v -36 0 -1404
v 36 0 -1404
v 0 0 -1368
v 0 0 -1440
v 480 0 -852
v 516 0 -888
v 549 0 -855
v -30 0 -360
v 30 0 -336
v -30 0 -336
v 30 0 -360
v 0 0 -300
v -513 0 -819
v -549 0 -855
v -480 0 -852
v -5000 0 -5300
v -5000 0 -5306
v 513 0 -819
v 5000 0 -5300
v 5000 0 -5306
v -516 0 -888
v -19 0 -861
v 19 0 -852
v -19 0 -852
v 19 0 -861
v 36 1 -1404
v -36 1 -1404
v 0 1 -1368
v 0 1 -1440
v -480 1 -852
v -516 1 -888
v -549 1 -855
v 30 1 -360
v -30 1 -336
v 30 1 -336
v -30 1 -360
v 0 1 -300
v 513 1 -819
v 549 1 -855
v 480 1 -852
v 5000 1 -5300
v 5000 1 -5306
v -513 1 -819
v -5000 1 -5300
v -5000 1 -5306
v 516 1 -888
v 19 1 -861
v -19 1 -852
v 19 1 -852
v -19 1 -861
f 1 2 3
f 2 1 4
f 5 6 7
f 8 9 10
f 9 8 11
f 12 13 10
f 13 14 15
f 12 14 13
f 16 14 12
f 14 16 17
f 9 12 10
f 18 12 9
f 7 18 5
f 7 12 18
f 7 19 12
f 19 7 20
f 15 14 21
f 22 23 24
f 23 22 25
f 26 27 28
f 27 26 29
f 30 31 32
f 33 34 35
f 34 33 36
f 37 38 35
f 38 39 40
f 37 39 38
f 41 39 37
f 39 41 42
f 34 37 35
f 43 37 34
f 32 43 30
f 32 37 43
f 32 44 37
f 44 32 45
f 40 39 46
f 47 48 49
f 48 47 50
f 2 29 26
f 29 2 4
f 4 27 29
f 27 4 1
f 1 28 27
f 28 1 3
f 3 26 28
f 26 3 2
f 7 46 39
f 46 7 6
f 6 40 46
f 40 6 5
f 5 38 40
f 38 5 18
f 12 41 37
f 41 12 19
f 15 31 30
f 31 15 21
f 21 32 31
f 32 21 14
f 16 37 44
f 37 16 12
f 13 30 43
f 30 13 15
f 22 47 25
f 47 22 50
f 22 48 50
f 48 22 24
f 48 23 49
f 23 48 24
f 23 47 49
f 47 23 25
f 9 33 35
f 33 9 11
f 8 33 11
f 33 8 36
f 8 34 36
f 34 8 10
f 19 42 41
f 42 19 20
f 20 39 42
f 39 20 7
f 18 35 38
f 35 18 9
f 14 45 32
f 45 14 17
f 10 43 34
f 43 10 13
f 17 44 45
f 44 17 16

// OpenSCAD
$fs = 120;

$vpt = [0,1080,480];
$vpr = [-34,0,0];
$vpf = 45;

foul_line = 6;
plain_color = [1,1,1,0.8];
out_color = [1,0.75,0.75,0.8];
eat_color = [0.5,0.75,1,0.8];

// home, first, second, third, rubber
color([1,1,1]) scale([1,-1,-1]) rotate([90,0,0]) linear_extrude(1) {
    polygon([[-30,30*2+300],[30,30*2+300],[30,30+300],[0,300],[-30,30+300]]);
    polygon([[552-36*2,852],[552-36,852+36],[552,852],[552-36,852-36]]);
    polygon([[0,1404+36],[36,1404],[0,1404-36],[-36,1404]]);
    polygon([[-552+36*2,852],[-552+36,852+36],[-552,852],[-552+36,852-36]]);
    polygon([[-19,852],[19,852],[19,9+852],[-19,9+852]]);
}

// foul lines
color([1,1,1,0.5]) scale([1,-1,-1]) rotate([90,0,0]) linear_extrude(1) {
    polygon([[0,300],[-5000,300+5000],[-5000,300+5000+foul_line],[0,300+foul_line]]);
    polygon([[0,300],[5000,300+5000],[5000,300+5000+foul_line],[0,300+foul_line]]);
}

scale([0.1,0.1,-0.1]) translate([-23200,0,0]) {
    color(out_color) polyhedron([[9830,0,15820],[13170,0,23860],[9830,1150,15820],[13170,1150,23860]], [[0,1,3,2]]);
    color(out_color) polyhedron([[9830,0,15820],[9830,0,15920],[9830,1150,15820],[9830,1150,15920]], [[0,1,3,2]]);
    color(out_color) polyhedron([[13170,0,23860],[13170,0,23960],[13170,1150,23860],[13170,1150,23960]], [[0,1,3,2]]);
    color(out_color) polyhedron([[9830,0,15920],[13170,0,23960],[9830,1150,15920],[13170,1150,23960]], [[0,1,3,2]]);
    color(out_color) polyhedron([[9830,1150,15820],[9830,1150,15920],[13170,1150,23860],[13170,1150,23960]], [[0,1,3,2]]);
    color(out_color) polyhedron([[13170,0,23860],[19620,0,28270],[13170,1150,23860],[19620,1150,28270]], [[0,1,3,2]]);
    color(out_color) polyhedron([[13170,0,23860],[13170,0,23960],[13170,1150,23860],[13170,1150,23960]], [[0,1,3,2]]);
    color(out_color) polyhedron([[19620,0,28270],[19620,0,28370],[19620,1150,28270],[19620,1150,28370]], [[0,1,3,2]]);
    color(out_color) polyhedron([[13170,0,23960],[19620,0,28370],[13170,1150,23960],[19620,1150,28370]], [[0,1,3,2]]);
    color(out_color) polyhedron([[13170,1150,23860],[13170,1150,23960],[19620,1150,28270],[19620,1150,28370]], [[0,1,3,2]]);
    color(out_color) polyhedron([[19620,0,28270],[20680,0,28270],[19620,1150,28270],[20680,1150,28270]], [[0,1,3,2]]);
    color(out_color) polyhedron([[19620,0,28270],[19620,0,28370],[19620,1150,28270],[19620,1150,28370]], [[0,1,3,2]]);
    color(out_color) polyhedron([[20680,0,28270],[20680,0,28370],[20680,1150,28270],[20680,1150,28370]], [[0,1,3,2]]);
    color(out_color) polyhedron([[19620,0,28370],[20680,0,28370],[19620,1150,28370],[20680,1150,28370]], [[0,1,3,2]]);
    color(out_color) polyhedron([[19620,1150,28270],[19620,1150,28370],[20680,1150,28270],[20680,1150,28370]], [[0,1,3,2]]);
    color(plain_color) polyhedron([[20680,0,28270],[25520,0,28270],[20680,1150,28270],[25520,1150,28270]], [[0,1,3,2]]);
    color(plain_color) polyhedron([[20680,0,28270],[20680,0,28370],[20680,1150,28270],[20680,1150,28370]], [[0,1,3,2]]);
    color(plain_color) polyhedron([[25520,0,28270],[25520,0,28370],[25520,1150,28270],[25520,1150,28370]], [[0,1,3,2]]);
    color(plain_color) polyhedron([[20680,0,28370],[25520,0,28370],[20680,1150,28370],[25520,1150,28370]], [[0,1,3,2]]);
    color(plain_color) polyhedron([[20680,1150,28270],[20680,1150,28370],[25520,1150,28270],[25520,1150,28370]], [[0,1,3,2]]);
    color(out_color) polyhedron([[25520,0,28270],[26780,0,28270],[25520,1150,28270],[26780,1150,28270]], [[0,1,3,2]]);
    color(out_color) polyhedron([[25520,0,28270],[25520,0,28370],[25520,1150,28270],[25520,1200,28370]], [[0,1,3,2]]);
    color(out_color) polyhedron([[26780,0,28270],[26790,0,28370],[26780,1150,28270],[26790,1200,28370]], [[0,1,3,2]]);
    color(out_color) polyhedron([[25520,0,28370],[26790,0,28370],[25520,1200,28370],[26790,1200,28370]], [[0,1,3,2]]);
    color(out_color) polyhedron([[25520,1150,28270],[25520,1200,28370],[26780,1150,28270],[26790,1200,28370]], [[0,1,3,2]]);
    color(out_color) polyhedron([[26780,0,28270],[33230,0,23860],[26780,1150,28270],[33230,1150,23860]], [[0,1,3,2]]);
    color(out_color) polyhedron([[26780,0,28270],[26780,0,28370],[26780,1150,28270],[26780,1150,28370]], [[0,1,3,2]]);
    color(out_color) polyhedron([[33230,0,23860],[33230,0,23960],[33230,1150,23860],[33230,1150,23960]], [[0,1,3,2]]);
    color(out_color) polyhedron([[26780,0,28370],[33230,0,23960],[26780,1150,28370],[33230,1150,23960]], [[0,1,3,2]]);
    color(out_color) polyhedron([[26780,1150,28270],[26780,1150,28370],[33230,1150,23860],[33230,1150,23960]], [[0,1,3,2]]);
    color(out_color) polyhedron([[33230,0,23860],[36570,0,15820],[33230,1150,23860],[36570,1150,15820]], [[0,1,3,2]]);
    color(out_color) polyhedron([[33230,0,23860],[33230,0,23960],[33230,1150,23860],[33230,1150,23960]], [[0,1,3,2]]);
    color(out_color) polyhedron([[36570,0,15820],[36570,0,15920],[36570,1150,15820],[36570,1150,15920]], [[0,1,3,2]]);
    color(out_color) polyhedron([[33230,0,23960],[36570,0,15920],[33230,1150,23960],[36570,1150,15920]], [[0,1,3,2]]);
    color(out_color) polyhedron([[33230,1150,23860],[33230,1150,23960],[36570,1150,15820],[36570,1150,15920]], [[0,1,3,2]]);
    color(out_color) polyhedron([[16130,0,5030],[18700,0,2560],[16130,1100,5030],[18700,1100,2560]], [[0,1,3,2]]);
    color(out_color) polyhedron([[16130,0,5030],[16970,0,6570],[16130,1100,5030],[16970,1500,6570]], [[0,1,3,2]]);
    color(out_color) polyhedron([[18700,0,2560],[19850,0,3680],[18700,1100,2560],[19850,1500,3680]], [[0,1,3,2]]);
    color(out_color) polyhedron([[16970,0,6570],[19850,0,3680],[16970,1500,6570],[19850,1500,3680]], [[0,1,3,2]]);
    color(out_color) polyhedron([[16130,1100,5030],[16970,1500,6570],[18700,1100,2560],[19850,1500,3680]], [[0,1,3,2]]);
    color(out_color) polyhedron([[27700,0,2560],[30270,0,5030],[27700,1100,2560],[30270,1100,5030]], [[0,1,3,2]]);
    color(out_color) polyhedron([[27700,0,2560],[26550,0,3680],[27700,1100,2560],[26550,1500,3680]], [[0,1,3,2]]);
    color(out_color) polyhedron([[30270,0,5030],[29440,0,6570],[30270,1100,5030],[29440,1500,6570]], [[0,1,3,2]]);
    color(out_color) polyhedron([[26550,0,3680],[29440,0,6570],[26550,1500,3680],[29440,1500,6570]], [[0,1,3,2]]);
    color(out_color) polyhedron([[27700,1100,2560],[26550,1500,3680],[30270,1100,5030],[29440,1500,6570]], [[0,1,3,2]]);
    color(out_color) polyhedron([[20680,0,28370],[25520,0,28370],[20680,3500,28370],[25520,3500,28370]], [[0,1,3,2]]);
    color(out_color) polyhedron([[20680,0,28370],[20680,0,28470],[20680,3500,28370],[20680,3500,28470]], [[0,1,3,2]]);
    color(out_color) polyhedron([[25520,0,28370],[25520,0,28480],[25520,3500,28370],[25520,3500,28480]], [[0,1,3,2]]);
    color(out_color) polyhedron([[20680,0,28470],[25520,0,28480],[20680,3500,28470],[25520,3500,28480]], [[0,1,3,2]]);
    color(out_color) polyhedron([[20680,3500,28370],[20680,3500,28470],[25520,3500,28370],[25520,3500,28480]], [[0,1,3,2]]);
    color(out_color) polyhedron([[2900,0,17745],[19700,0,1598],[2900,5,17745],[19700,5,1598]], [[0,1,3,2]]);
    color(out_color) polyhedron([[2900,0,17745],[2900,0,17755],[2900,5,17745],[2900,5,17755]], [[0,1,3,2]]);
    color(out_color) polyhedron([[19700,0,1598],[19700,0,1608],[19700,5,1598],[19700,5,1608]], [[0,1,3,2]]);
    color(out_color) polyhedron([[2900,0,17755],[19700,0,1608],[2900,5,17755],[19700,5,1608]], [[0,1,3,2]]);
    color(out_color) polyhedron([[2900,5,17745],[2900,5,17755],[19700,5,1598],[19700,5,1608]], [[0,1,3,2]]);
    color(out_color) polyhedron([[26000,0,925],[40000,0,14381],[26000,5,925],[40000,5,14381]], [[0,1,3,2]]);
    color(out_color) polyhedron([[26000,0,925],[26000,0,935],[26000,5,925],[26000,5,935]], [[0,1,3,2]]);
    color(out_color) polyhedron([[40000,0,14381],[40000,0,14391],[40000,5,14381],[40000,5,14391]], [[0,1,3,2]]);
    color(out_color) polyhedron([[26000,0,935],[40000,0,14391],[26000,5,935],[40000,5,14391]], [[0,1,3,2]]);
    color(out_color) polyhedron([[26000,5,925],[26000,5,935],[40000,5,14381],[40000,5,14391]], [[0,1,3,2]]);
    color(plain_color) polyhedron([[0,0,0],[0,0,0],[0,0,0],[0,0,0]], [[0,1,3,2]]);
    color(plain_color) polyhedron([[0,0,0],[0,0,0],[0,0,0],[0,0,0]], [[0,1,3,2]]);
    color(plain_color) polyhedron([[0,0,0],[0,0,0],[0,0,0],[0,0,0]], [[0,1,3,2]]);
    color(plain_color) polyhedron([[0,0,0],[0,0,0],[0,0,0],[0,0,0]], [[0,1,3,2]]);
    color(plain_color) polyhedron([[0,0,0],[0,0,0],[0,0,0],[0,0,0]], [[0,1,3,2]]);
    color(plain_color) polyhedron([[0,0,0],[0,0,0],[0,0,0],[0,0,0]], [[0,1,3,2]]);
    color(plain_color) polyhedron([[0,0,0],[0,0,0],[0,0,0],[0,0,0]], [[0,1,3,2]]);
    color(plain_color) polyhedron([[0,0,0],[0,0,0],[0,0,0],[0,0,0]], [[0,1,3,2]]);
    color(plain_color) polyhedron([[0,0,0],[0,0,0],[0,0,0],[0,0,0]], [[0,1,3,2]]);
    color(plain_color) polyhedron([[0,0,0],[0,0,0],[0,0,0],[0,0,0]], [[0,1,3,2]]);
    color(plain_color) polyhedron([[0,0,0],[0,0,0],[0,0,0],[0,0,0]], [[0,1,3,2]]);
    color(plain_color) polyhedron([[0,0,0],[0,0,0],[0,0,0],[0,0,0]], [[0,1,3,2]]);
    color(plain_color) polyhedron([[0,0,0],[0,0,0],[0,0,0],[0,0,0]], [[0,1,3,2]]);
    color(plain_color) polyhedron([[0,0,0],[0,0,0],[0,0,0],[0,0,0]], [[0,1,3,2]]);
    color(plain_color) polyhedron([[0,0,0],[0,0,0],[0,0,0],[0,0,0]], [[0,1,3,2]]);
    color(plain_color) polyhedron([[0,0,0],[0,0,0],[0,0,0],[0,0,0]], [[0,1,3,2]]);
    color(plain_color) polyhedron([[0,0,0],[0,0,0],[0,0,0],[0,0,0]], [[0,1,3,2]]);
    color(plain_color) polyhedron([[0,0,0],[0,0,0],[0,0,0],[0,0,0]], [[0,1,3,2]]);
    color(plain_color) polyhedron([[0,0,0],[0,0,0],[0,0,0],[0,0,0]], [[0,1,3,2]]);
    color(plain_color) polyhedron([[0,0,0],[0,0,0],[0,0,0],[0,0,0]], [[0,1,3,2]]);
    color(plain_color) polyhedron([[0,0,0],[0,0,0],[0,0,0],[0,0,0]], [[0,1,3,2]]);
    color(plain_color) polyhedron([[0,0,0],[0,0,0],[0,0,0],[0,0,0]], [[0,1,3,2]]);
    color(plain_color) polyhedron([[0,0,0],[0,0,0],[0,0,0],[0,0,0]], [[0,1,3,2]]);
    color(plain_color) polyhedron([[0,0,0],[0,0,0],[0,0,0],[0,0,0]], [[0,1,3,2]]);
    color(plain_color) polyhedron([[0,0,0],[0,0,0],[0,0,0],[0,0,0]], [[0,1,3,2]]);
    color(plain_color) polyhedron([[0,0,0],[0,0,0],[0,0,0],[0,0,0]], [[0,1,3,2]]);
    color(plain_color) polyhedron([[0,0,0],[0,0,0],[0,0,0],[0,0,0]], [[0,1,3,2]]);
    color(plain_color) polyhedron([[0,0,0],[0,0,0],[0,0,0],[0,0,0]], [[0,1,3,2]]);
    color(plain_color) polyhedron([[0,0,0],[0,0,0],[0,0,0],[0,0,0]], [[0,1,3,2]]);
    color(plain_color) polyhedron([[0,0,0],[0,0,0],[0,0,0],[0,0,0]], [[0,1,3,2]]);
    color(plain_color) polyhedron([[0,0,0],[0,0,0],[0,0,0],[0,0,0]], [[0,1,3,2]]);
    color(plain_color) polyhedron([[0,0,0],[0,0,0],[0,0,0],[0,0,0]], [[0,1,3,2]]);
    color(plain_color) polyhedron([[0,0,0],[0,0,0],[0,0,0],[0,0,0]], [[0,1,3,2]]);
    color(plain_color) polyhedron([[0,0,0],[0,0,0],[0,0,0],[0,0,0]], [[0,1,3,2]]);
    color(plain_color) polyhedron([[0,0,0],[0,0,0],[0,0,0],[0,0,0]], [[0,1,3,2]]);
    color(plain_color) polyhedron([[0,0,0],[0,0,0],[0,0,0],[0,0,0]], [[0,1,3,2]]);
    color(plain_color) polyhedron([[0,0,0],[0,0,0],[0,0,0],[0,0,0]], [[0,1,3,2]]);
    color(plain_color) polyhedron([[0,0,0],[0,0,0],[0,0,0],[0,0,0]], [[0,1,3,2]]);
    color(plain_color) polyhedron([[0,0,0],[0,0,0],[0,0,0],[0,0,0]], [[0,1,3,2]]);
    color(plain_color) polyhedron([[0,0,0],[0,0,0],[0,0,0],[0,0,0]], [[0,1,3,2]]);
    color(plain_color) polyhedron([[0,0,0],[0,0,0],[0,0,0],[0,0,0]], [[0,1,3,2]]);
    color(plain_color) polyhedron([[0,0,0],[0,0,0],[0,0,0],[0,0,0]], [[0,1,3,2]]);
    color(plain_color) polyhedron([[0,0,0],[0,0,0],[0,0,0],[0,0,0]], [[0,1,3,2]]);
    color(plain_color) polyhedron([[0,0,0],[0,0,0],[0,0,0],[0,0,0]], [[0,1,3,2]]);
    color(plain_color) polyhedron([[0,0,0],[0,0,0],[0,0,0],[0,0,0]], [[0,1,3,2]]);
    color(plain_color) polyhedron([[0,0,0],[0,0,0],[0,0,0],[0,0,0]], [[0,1,3,2]]);
    color(plain_color) polyhedron([[0,0,0],[0,0,0],[0,0,0],[0,0,0]], [[0,1,3,2]]);
    color(plain_color) polyhedron([[0,0,0],[0,0,0],[0,0,0],[0,0,0]], [[0,1,3,2]]);
    color(plain_color) polyhedron([[0,0,0],[0,0,0],[0,0,0],[0,0,0]], [[0,1,3,2]]);
    color(plain_color) polyhedron([[0,0,0],[0,0,0],[0,0,0],[0,0,0]], [[0,1,3,2]]);
    color(plain_color) polyhedron([[0,0,0],[0,0,0],[0,0,0],[0,0,0]], [[0,1,3,2]]);
    color(plain_color) polyhedron([[0,0,0],[0,0,0],[0,0,0],[0,0,0]], [[0,1,3,2]]);
    color(plain_color) polyhedron([[0,0,0],[0,0,0],[0,0,0],[0,0,0]], [[0,1,3,2]]);
    color(plain_color) polyhedron([[0,0,0],[0,0,0],[0,0,0],[0,0,0]], [[0,1,3,2]]);
    color(plain_color) polyhedron([[0,0,0],[0,0,0],[0,0,0],[0,0,0]], [[0,1,3,2]]);
    color(plain_color) polyhedron([[0,0,0],[0,0,0],[0,0,0],[0,0,0]], [[0,1,3,2]]);
    color(plain_color) polyhedron([[0,0,0],[0,0,0],[0,0,0],[0,0,0]], [[0,1,3,2]]);
    color(plain_color) polyhedron([[0,0,0],[0,0,0],[0,0,0],[0,0,0]], [[0,1,3,2]]);
    color(plain_color) polyhedron([[0,0,0],[0,0,0],[0,0,0],[0,0,0]], [[0,1,3,2]]);
    color(plain_color) polyhedron([[0,0,0],[0,0,0],[0,0,0],[0,0,0]], [[0,1,3,2]]);
    color(plain_color) polyhedron([[0,0,0],[0,0,0],[0,0,0],[0,0,0]], [[0,1,3,2]]);
    color(plain_color) polyhedron([[0,0,0],[0,0,0],[0,0,0],[0,0,0]], [[0,1,3,2]]);
    color(plain_color) polyhedron([[0,0,0],[0,0,0],[0,0,0],[0,0,0]], [[0,1,3,2]]);
    color(plain_color) polyhedron([[0,0,0],[0,0,0],[0,0,0],[0,0,0]], [[0,1,3,2]]);
    color(plain_color) polyhedron([[0,0,0],[0,0,0],[0,0,0],[0,0,0]], [[0,1,3,2]]);
    color(plain_color) polyhedron([[0,0,0],[0,0,0],[0,0,0],[0,0,0]], [[0,1,3,2]]);
    color(plain_color) polyhedron([[0,0,0],[0,0,0],[0,0,0],[0,0,0]], [[0,1,3,2]]);
    color(plain_color) polyhedron([[0,0,0],[0,0,0],[0,0,0],[0,0,0]], [[0,1,3,2]]);
    color(plain_color) polyhedron([[0,0,0],[0,0,0],[0,0,0],[0,0,0]], [[0,1,3,2]]);
    color(plain_color) polyhedron([[0,0,0],[0,0,0],[0,0,0],[0,0,0]], [[0,1,3,2]]);
    color(plain_color) polyhedron([[0,0,0],[0,0,0],[0,0,0],[0,0,0]], [[0,1,3,2]]);
    color(plain_color) polyhedron([[0,0,0],[0,0,0],[0,0,0],[0,0,0]], [[0,1,3,2]]);
    color(plain_color) polyhedron([[0,0,0],[0,0,0],[0,0,0],[0,0,0]], [[0,1,3,2]]);
    color(plain_color) polyhedron([[0,0,0],[0,0,0],[0,0,0],[0,0,0]], [[0,1,3,2]]);
    color(plain_color) polyhedron([[0,0,0],[0,0,0],[0,0,0],[0,0,0]], [[0,1,3,2]]);
    color(plain_color) polyhedron([[0,0,0],[0,0,0],[0,0,0],[0,0,0]], [[0,1,3,2]]);
    color(plain_color) polyhedron([[0,0,0],[0,0,0],[0,0,0],[0,0,0]], [[0,1,3,2]]);
    color(plain_color) polyhedron([[0,0,0],[0,0,0],[0,0,0],[0,0,0]], [[0,1,3,2]]);
    color(plain_color) polyhedron([[0,0,0],[0,0,0],[0,0,0],[0,0,0]], [[0,1,3,2]]);
    color(plain_color) polyhedron([[0,0,0],[0,0,0],[0,0,0],[0,0,0]], [[0,1,3,2]]);
    color(plain_color) polyhedron([[0,0,0],[0,0,0],[0,0,0],[0,0,0]], [[0,1,3,2]]);
    color(plain_color) polyhedron([[0,0,0],[0,0,0],[0,0,0],[0,0,0]], [[0,1,3,2]]);
    color(plain_color) polyhedron([[0,0,0],[0,0,0],[0,0,0],[0,0,0]], [[0,1,3,2]]);
    color(plain_color) polyhedron([[0,0,0],[0,0,0],[0,0,0],[0,0,0]], [[0,1,3,2]]);
    color(plain_color) polyhedron([[0,0,0],[0,0,0],[0,0,0],[0,0,0]], [[0,1,3,2]]);
    color(plain_color) polyhedron([[0,0,0],[0,0,0],[0,0,0],[0,0,0]], [[0,1,3,2]]);
    color(plain_color) polyhedron([[0,0,0],[0,0,0],[0,0,0],[0,0,0]], [[0,1,3,2]]);
    color(plain_color) polyhedron([[0,0,0],[0,0,0],[0,0,0],[0,0,0]], [[0,1,3,2]]);
    color(plain_color) polyhedron([[0,0,0],[0,0,0],[0,0,0],[0,0,0]], [[0,1,3,2]]);
    color(plain_color) polyhedron([[0,0,0],[0,0,0],[0,0,0],[0,0,0]], [[0,1,3,2]]);
    color(plain_color) polyhedron([[0,0,0],[0,0,0],[0,0,0],[0,0,0]], [[0,1,3,2]]);
    color(plain_color) polyhedron([[0,0,0],[0,0,0],[0,0,0],[0,0,0]], [[0,1,3,2]]);
    color(plain_color) polyhedron([[0,0,0],[0,0,0],[0,0,0],[0,0,0]], [[0,1,3,2]]);
    color(plain_color) polyhedron([[0,0,0],[0,0,0],[0,0,0],[0,0,0]], [[0,1,3,2]]);
    color(plain_color) polyhedron([[0,0,0],[0,0,0],[0,0,0],[0,0,0]], [[0,1,3,2]]);
    color(plain_color) polyhedron([[0,0,0],[0,0,0],[0,0,0],[0,0,0]], [[0,1,3,2]]);
    color(plain_color) polyhedron([[0,0,0],[0,0,0],[0,0,0],[0,0,0]], [[0,1,3,2]]);
    color(plain_color) polyhedron([[0,0,0],[0,0,0],[0,0,0],[0,0,0]], [[0,1,3,2]]);
    color(plain_color) polyhedron([[0,0,0],[0,0,0],[0,0,0],[0,0,0]], [[0,1,3,2]]);
    color(plain_color) polyhedron([[0,0,0],[0,0,0],[0,0,0],[0,0,0]], [[0,1,3,2]]);
    color(plain_color) polyhedron([[0,0,0],[0,0,0],[0,0,0],[0,0,0]], [[0,1,3,2]]);
    color(plain_color) polyhedron([[0,0,0],[0,0,0],[0,0,0],[0,0,0]], [[0,1,3,2]]);
    color(plain_color) polyhedron([[0,0,0],[0,0,0],[0,0,0],[0,0,0]], [[0,1,3,2]]);
    color(plain_color) polyhedron([[0,0,0],[0,0,0],[0,0,0],[0,0,0]], [[0,1,3,2]]);
    color(plain_color) polyhedron([[0,0,0],[0,0,0],[0,0,0],[0,0,0]], [[0,1,3,2]]);
    color(plain_color) polyhedron([[0,0,0],[0,0,0],[0,0,0],[0,0,0]], [[0,1,3,2]]);
    color(plain_color) polyhedron([[0,0,0],[0,0,0],[0,0,0],[0,0,0]], [[0,1,3,2]]);
    color(plain_color) polyhedron([[0,0,0],[0,0,0],[0,0,0],[0,0,0]], [[0,1,3,2]]);
    color(plain_color) polyhedron([[0,0,0],[0,0,0],[0,0,0],[0,0,0]], [[0,1,3,2]]);
    color(plain_color) polyhedron([[0,0,0],[0,0,0],[0,0,0],[0,0,0]], [[0,1,3,2]]);
    color(plain_color) polyhedron([[0,0,0],[0,0,0],[0,0,0],[0,0,0]], [[0,1,3,2]]);
    color(plain_color) polyhedron([[0,0,0],[0,0,0],[0,0,0],[0,0,0]], [[0,1,3,2]]);
    color(plain_color) polyhedron([[0,0,0],[0,0,0],[0,0,0],[0,0,0]], [[0,1,3,2]]);
    color(plain_color) polyhedron([[0,0,0],[0,0,0],[0,0,0],[0,0,0]], [[0,1,3,2]]);
    color(plain_color) polyhedron([[0,0,0],[0,0,0],[0,0,0],[0,0,0]], [[0,1,3,2]]);
    color(plain_color) polyhedron([[0,0,0],[0,0,0],[0,0,0],[0,0,0]], [[0,1,3,2]]);
    color(plain_color) polyhedron([[0,0,0],[0,0,0],[0,0,0],[0,0,0]], [[0,1,3,2]]);
    color(plain_color) polyhedron([[0,0,0],[0,0,0],[0,0,0],[0,0,0]], [[0,1,3,2]]);
    color(plain_color) polyhedron([[0,0,0],[0,0,0],[0,0,0],[0,0,0]], [[0,1,3,2]]);
    color(plain_color) polyhedron([[0,0,0],[0,0,0],[0,0,0],[0,0,0]], [[0,1,3,2]]);
    color(plain_color) polyhedron([[0,0,0],[0,0,0],[0,0,0],[0,0,0]], [[0,1,3,2]]);
    color(plain_color) polyhedron([[0,0,0],[0,0,0],[0,0,0],[0,0,0]], [[0,1,3,2]]);
    color(plain_color) polyhedron([[0,0,0],[0,0,0],[0,0,0],[0,0,0]], [[0,1,3,2]]);
    color(plain_color) polyhedron([[0,0,0],[0,0,0],[0,0,0],[0,0,0]], [[0,1,3,2]]);
    color(plain_color) polyhedron([[0,0,0],[0,0,0],[0,0,0],[0,0,0]], [[0,1,3,2]]);
    color(plain_color) polyhedron([[0,0,0],[0,0,0],[0,0,0],[0,0,0]], [[0,1,3,2]]);
    color(plain_color) polyhedron([[0,0,0],[0,0,0],[0,0,0],[0,0,0]], [[0,1,3,2]]);
    color(plain_color) polyhedron([[0,0,0],[0,0,0],[0,0,0],[0,0,0]], [[0,1,3,2]]);
    color(plain_color) polyhedron([[0,0,0],[0,0,0],[0,0,0],[0,0,0]], [[0,1,3,2]]);
    color(plain_color) polyhedron([[0,0,0],[0,0,0],[0,0,0],[0,0,0]], [[0,1,3,2]]);
    color(plain_color) polyhedron([[0,0,0],[0,0,0],[0,0,0],[0,0,0]], [[0,1,3,2]]);
    color(plain_color) polyhedron([[0,0,0],[0,0,0],[0,0,0],[0,0,0]], [[0,1,3,2]]);
    color(plain_color) polyhedron([[0,0,0],[0,0,0],[0,0,0],[0,0,0]], [[0,1,3,2]]);
    color(plain_color) polyhedron([[0,0,0],[0,0,0],[0,0,0],[0,0,0]], [[0,1,3,2]]);
    color(plain_color) polyhedron([[0,0,0],[0,0,0],[0,0,0],[0,0,0]], [[0,1,3,2]]);
    color(plain_color) polyhedron([[0,0,0],[0,0,0],[0,0,0],[0,0,0]], [[0,1,3,2]]);
    color(plain_color) polyhedron([[0,0,0],[0,0,0],[0,0,0],[0,0,0]], [[0,1,3,2]]);
    color(plain_color) polyhedron([[0,0,0],[0,0,0],[0,0,0],[0,0,0]], [[0,1,3,2]]);
    color(plain_color) polyhedron([[0,0,0],[0,0,0],[0,0,0],[0,0,0]], [[0,1,3,2]]);
    color(plain_color) polyhedron([[0,0,0],[0,0,0],[0,0,0],[0,0,0]], [[0,1,3,2]]);
    color(plain_color) polyhedron([[0,0,0],[0,0,0],[0,0,0],[0,0,0]], [[0,1,3,2]]);
    color(plain_color) polyhedron([[0,0,0],[0,0,0],[0,0,0],[0,0,0]], [[0,1,3,2]]);
    color(plain_color) polyhedron([[0,0,0],[0,0,0],[0,0,0],[0,0,0]], [[0,1,3,2]]);
    color(plain_color) polyhedron([[0,0,0],[0,0,0],[0,0,0],[0,0,0]], [[0,1,3,2]]);
    color(plain_color) polyhedron([[0,0,0],[0,0,0],[0,0,0],[0,0,0]], [[0,1,3,2]]);
    color(plain_color) polyhedron([[0,0,0],[0,0,0],[0,0,0],[0,0,0]], [[0,1,3,2]]);
    color(plain_color) polyhedron([[0,0,0],[0,0,0],[0,0,0],[0,0,0]], [[0,1,3,2]]);
    color(plain_color) polyhedron([[0,0,0],[0,0,0],[0,0,0],[0,0,0]], [[0,1,3,2]]);
    color(plain_color) polyhedron([[0,0,0],[0,0,0],[0,0,0],[0,0,0]], [[0,1,3,2]]);
    color(plain_color) polyhedron([[0,0,0],[0,0,0],[0,0,0],[0,0,0]], [[0,1,3,2]]);
    color(plain_color) polyhedron([[0,0,0],[0,0,0],[0,0,0],[0,0,0]], [[0,1,3,2]]);
    color(plain_color) polyhedron([[0,0,0],[0,0,0],[0,0,0],[0,0,0]], [[0,1,3,2]]);
    color(plain_color) polyhedron([[0,0,0],[0,0,0],[0,0,0],[0,0,0]], [[0,1,3,2]]);
    color(plain_color) polyhedron([[0,0,0],[0,0,0],[0,0,0],[0,0,0]], [[0,1,3,2]]);
    color(plain_color) polyhedron([[0,0,0],[0,0,0],[0,0,0],[0,0,0]], [[0,1,3,2]]);
    color(plain_color) polyhedron([[0,0,0],[0,0,0],[0,0,0],[0,0,0]], [[0,1,3,2]]);
    color(plain_color) polyhedron([[0,0,0],[0,0,0],[0,0,0],[0,0,0]], [[0,1,3,2]]);
    color(plain_color) polyhedron([[0,0,0],[0,0,0],[0,0,0],[0,0,0]], [[0,1,3,2]]);
    color(plain_color) polyhedron([[0,0,0],[0,0,0],[0,0,0],[0,0,0]], [[0,1,3,2]]);
    color(plain_color) polyhedron([[0,0,0],[0,0,0],[0,0,0],[0,0,0]], [[0,1,3,2]]);
    color(plain_color) polyhedron([[0,0,0],[0,0,0],[0,0,0],[0,0,0]], [[0,1,3,2]]);
    color(plain_color) polyhedron([[0,0,0],[0,0,0],[0,0,0],[0,0,0]], [[0,1,3,2]]);
    color(plain_color) polyhedron([[0,0,0],[0,0,0],[0,0,0],[0,0,0]], [[0,1,3,2]]);
    color(plain_color) polyhedron([[0,0,0],[0,0,0],[0,0,0],[0,0,0]], [[0,1,3,2]]);
    color(plain_color) polyhedron([[0,0,0],[0,0,0],[0,0,0],[0,0,0]], [[0,1,3,2]]);
    color(plain_color) polyhedron([[0,0,0],[0,0,0],[0,0,0],[0,0,0]], [[0,1,3,2]]);
    color(plain_color) polyhedron([[0,0,0],[0,0,0],[0,0,0],[0,0,0]], [[0,1,3,2]]);
    color(plain_color) polyhedron([[0,0,0],[0,0,0],[0,0,0],[0,0,0]], [[0,1,3,2]]);
    color(plain_color) polyhedron([[0,0,0],[0,0,0],[0,0,0],[0,0,0]], [[0,1,3,2]]);
    color(plain_color) polyhedron([[0,0,0],[0,0,0],[0,0,0],[0,0,0]], [[0,1,3,2]]);
    color(plain_color) polyhedron([[0,0,0],[0,0,0],[0,0,0],[0,0,0]], [[0,1,3,2]]);
    color(plain_color) polyhedron([[0,0,0],[0,0,0],[0,0,0],[0,0,0]], [[0,1,3,2]]);
    color(plain_color) polyhedron([[0,0,0],[0,0,0],[0,0,0],[0,0,0]], [[0,1,3,2]]);
    color(plain_color) polyhedron([[0,0,0],[0,0,0],[0,0,0],[0,0,0]], [[0,1,3,2]]);
    color(plain_color) polyhedron([[0,0,0],[0,0,0],[0,0,0],[0,0,0]], [[0,1,3,2]]);
    color(plain_color) polyhedron([[0,0,0],[0,0,0],[0,0,0],[0,0,0]], [[0,1,3,2]]);
    color(plain_color) polyhedron([[0,0,0],[0,0,0],[0,0,0],[0,0,0]], [[0,1,3,2]]);
    color(plain_color) polyhedron([[0,0,0],[0,0,0],[0,0,0],[0,0,0]], [[0,1,3,2]]);
    color(plain_color) polyhedron([[0,0,0],[0,0,0],[0,0,0],[0,0,0]], [[0,1,3,2]]);
    color(plain_color) polyhedron([[0,0,0],[0,0,0],[0,0,0],[0,0,0]], [[0,1,3,2]]);
    color(plain_color) polyhedron([[0,0,0],[0,0,0],[0,0,0],[0,0,0]], [[0,1,3,2]]);
    color(plain_color) polyhedron([[0,0,0],[0,0,0],[0,0,0],[0,0,0]], [[0,1,3,2]]);
    color(plain_color) polyhedron([[0,0,0],[0,0,0],[0,0,0],[0,0,0]], [[0,1,3,2]]);
    color(plain_color) polyhedron([[0,0,0],[0,0,0],[0,0,0],[0,0,0]], [[0,1,3,2]]);
    color(plain_color) polyhedron([[0,0,0],[0,0,0],[0,0,0],[0,0,0]], [[0,1,3,2]]);
    color(plain_color) polyhedron([[0,0,0],[0,0,0],[0,0,0],[0,0,0]], [[0,1,3,2]]);
    color(plain_color) polyhedron([[0,0,0],[0,0,0],[0,0,0],[0,0,0]], [[0,1,3,2]]);
    color(plain_color) polyhedron([[0,0,0],[0,0,0],[0,0,0],[0,0,0]], [[0,1,3,2]]);
    color(plain_color) polyhedron([[0,0,0],[0,0,0],[0,0,0],[0,0,0]], [[0,1,3,2]]);
    color(plain_color) polyhedron([[0,0,0],[0,0,0],[0,0,0],[0,0,0]], [[0,1,3,2]]);
    color(plain_color) polyhedron([[0,0,0],[0,0,0],[0,0,0],[0,0,0]], [[0,1,3,2]]);
    color(plain_color) polyhedron([[0,0,0],[0,0,0],[0,0,0],[0,0,0]], [[0,1,3,2]]);
    color(plain_color) polyhedron([[0,0,0],[0,0,0],[0,0,0],[0,0,0]], [[0,1,3,2]]);
    color(plain_color) polyhedron([[0,0,0],[0,0,0],[0,0,0],[0,0,0]], [[0,1,3,2]]);
    color(plain_color) polyhedron([[0,0,0],[0,0,0],[0,0,0],[0,0,0]], [[0,1,3,2]]);
    color(plain_color) polyhedron([[0,0,0],[0,0,0],[0,0,0],[0,0,0]], [[0,1,3,2]]);
    color(plain_color) polyhedron([[0,0,0],[0,0,0],[0,0,0],[0,0,0]], [[0,1,3,2]]);
    color(plain_color) polyhedron([[0,0,0],[0,0,0],[0,0,0],[0,0,0]], [[0,1,3,2]]);
    color(plain_color) polyhedron([[0,0,0],[0,0,0],[0,0,0],[0,0,0]], [[0,1,3,2]]);
    color(plain_color) polyhedron([[0,0,0],[0,0,0],[0,0,0],[0,0,0]], [[0,1,3,2]]);
    color(plain_color) polyhedron([[0,0,0],[0,0,0],[0,0,0],[0,0,0]], [[0,1,3,2]]);
    color(plain_color) polyhedron([[0,0,0],[0,0,0],[0,0,0],[0,0,0]], [[0,1,3,2]]);
    color(plain_color) polyhedron([[0,0,0],[0,0,0],[0,0,0],[0,0,0]], [[0,1,3,2]]);
    color(plain_color) polyhedron([[0,0,0],[0,0,0],[0,0,0],[0,0,0]], [[0,1,3,2]]);
    color(plain_color) polyhedron([[0,0,0],[0,0,0],[0,0,0],[0,0,0]], [[0,1,3,2]]);
    color(plain_color) polyhedron([[0,0,0],[0,0,0],[0,0,0],[0,0,0]], [[0,1,3,2]]);
    color(plain_color) polyhedron([[0,0,0],[0,0,0],[0,0,0],[0,0,0]], [[0,1,3,2]]);
    color(plain_color) polyhedron([[0,0,0],[0,0,0],[0,0,0],[0,0,0]], [[0,1,3,2]]);
    color(plain_color) polyhedron([[0,0,0],[0,0,0],[0,0,0],[0,0,0]], [[0,1,3,2]]);
    color(plain_color) polyhedron([[0,0,0],[0,0,0],[0,0,0],[0,0,0]], [[0,1,3,2]]);
    color(plain_color) polyhedron([[0,0,0],[0,0,0],[0,0,0],[0,0,0]], [[0,1,3,2]]);
    color(plain_color) polyhedron([[0,0,0],[0,0,0],[0,0,0],[0,0,0]], [[0,1,3,2]]);
    color(plain_color) polyhedron([[0,0,0],[0,0,0],[0,0,0],[0,0,0]], [[0,1,3,2]]);
    color(plain_color) polyhedron([[0,0,0],[0,0,0],[0,0,0],[0,0,0]], [[0,1,3,2]]);
    color(plain_color) polyhedron([[0,0,0],[0,0,0],[0,0,0],[0,0,0]], [[0,1,3,2]]);
    color(plain_color) polyhedron([[0,0,0],[0,0,0],[0,0,0],[0,0,0]], [[0,1,3,2]]);
    color(plain_color) polyhedron([[0,0,0],[0,0,0],[0,0,0],[0,0,0]], [[0,1,3,2]]);
    color(plain_color) polyhedron([[0,0,0],[0,0,0],[0,0,0],[0,0,0]], [[0,1,3,2]]);
    color(plain_color) polyhedron([[0,0,0],[0,0,0],[0,0,0],[0,0,0]], [[0,1,3,2]]);
    color(plain_color) polyhedron([[0,0,0],[0,0,0],[0,0,0],[0,0,0]], [[0,1,3,2]]);
    color(plain_color) polyhedron([[0,0,0],[0,0,0],[0,0,0],[0,0,0]], [[0,1,3,2]]);
    color(plain_color) polyhedron([[0,0,0],[0,0,0],[0,0,0],[0,0,0]], [[0,1,3,2]]);
    color(plain_color) polyhedron([[0,0,0],[0,0,0],[0,0,0],[0,0,0]], [[0,1,3,2]]);
    color(plain_color) polyhedron([[0,0,0],[0,0,0],[0,0,0],[0,0,0]], [[0,1,3,2]]);
    color(plain_color) polyhedron([[0,0,0],[0,0,0],[0,0,0],[0,0,0]], [[0,1,3,2]]);
    color(plain_color) polyhedron([[0,0,0],[0,0,0],[0,0,0],[0,0,0]], [[0,1,3,2]]);
    color(plain_color) polyhedron([[0,0,0],[0,0,0],[0,0,0],[0,0,0]], [[0,1,3,2]]);
    color(plain_color) polyhedron([[0,0,0],[0,0,0],[0,0,0],[0,0,0]], [[0,1,3,2]]);
    color(plain_color) polyhedron([[0,0,0],[0,0,0],[0,0,0],[0,0,0]], [[0,1,3,2]]);
    color(plain_color) polyhedron([[0,0,0],[0,0,0],[0,0,0],[0,0,0]], [[0,1,3,2]]);
    color(plain_color) polyhedron([[0,0,0],[0,0,0],[0,0,0],[0,0,0]], [[0,1,3,2]]);
    color(plain_color) polyhedron([[0,0,0],[0,0,0],[0,0,0],[0,0,0]], [[0,1,3,2]]);
    color(plain_color) polyhedron([[0,0,0],[0,0,0],[0,0,0],[0,0,0]], [[0,1,3,2]]);
    color(plain_color) polyhedron([[0,0,0],[0,0,0],[0,0,0],[0,0,0]], [[0,1,3,2]]);
    color(plain_color) polyhedron([[0,0,0],[0,0,0],[0,0,0],[0,0,0]], [[0,1,3,2]]);
    color(plain_color) polyhedron([[0,0,0],[0,0,0],[0,0,0],[0,0,0]], [[0,1,3,2]]);
    color(plain_color) polyhedron([[0,0,0],[0,0,0],[0,0,0],[0,0,0]], [[0,1,3,2]]);
    color(plain_color) polyhedron([[0,0,0],[0,0,0],[0,0,0],[0,0,0]], [[0,1,3,2]]);
    color(plain_color) polyhedron([[0,0,0],[0,0,0],[0,0,0],[0,0,0]], [[0,1,3,2]]);
    color(plain_color) polyhedron([[0,0,0],[0,0,0],[0,0,0],[0,0,0]], [[0,1,3,2]]);
    color(plain_color) polyhedron([[0,0,0],[0,0,0],[0,0,0],[0,0,0]], [[0,1,3,2]]);
    color(plain_color) polyhedron([[0,0,0],[0,0,0],[0,0,0],[0,0,0]], [[0,1,3,2]]);
    color(plain_color) polyhedron([[0,0,0],[0,0,0],[0,0,0],[0,0,0]], [[0,1,3,2]]);
    color(plain_color) polyhedron([[0,0,0],[0,0,0],[0,0,0],[0,0,0]], [[0,1,3,2]]);
    color(plain_color) polyhedron([[0,0,0],[0,0,0],[0,0,0],[0,0,0]], [[0,1,3,2]]);
    color(plain_color) polyhedron([[0,0,0],[0,0,0],[0,0,0],[0,0,0]], [[0,1,3,2]]);
    color(plain_color) polyhedron([[0,0,0],[0,0,0],[0,0,0],[0,0,0]], [[0,1,3,2]]);
    color(plain_color) polyhedron([[0,0,0],[0,0,0],[0,0,0],[0,0,0]], [[0,1,3,2]]);
    color(plain_color) polyhedron([[0,0,0],[0,0,0],[0,0,0],[0,0,0]], [[0,1,3,2]]);
    color(plain_color) polyhedron([[0,0,0],[0,0,0],[0,0,0],[0,0,0]], [[0,1,3,2]]);
    color(plain_color) polyhedron([[0,0,0],[0,0,0],[0,0,0],[0,0,0]], [[0,1,3,2]]);
    color(plain_color) polyhedron([[0,0,0],[0,0,0],[0,0,0],[0,0,0]], [[0,1,3,2]]);
    color(plain_color) polyhedron([[0,0,0],[0,0,0],[0,0,0],[0,0,0]], [[0,1,3,2]]);
    color(plain_color) polyhedron([[0,0,0],[0,0,0],[0,0,0],[0,0,0]], [[0,1,3,2]]);
    color(plain_color) polyhedron([[0,0,0],[0,0,0],[0,0,0],[0,0,0]], [[0,1,3,2]]);
    color(plain_color) polyhedron([[0,0,0],[0,0,0],[0,0,0],[0,0,0]], [[0,1,3,2]]);
    color(plain_color) polyhedron([[0,0,0],[0,0,0],[0,0,0],[0,0,0]], [[0,1,3,2]]);
    color(plain_color) polyhedron([[0,0,0],[0,0,0],[0,0,0],[0,0,0]], [[0,1,3,2]]);
    color(plain_color) polyhedron([[0,0,0],[0,0,0],[0,0,0],[0,0,0]], [[0,1,3,2]]);
    color(plain_color) polyhedron([[0,0,0],[0,0,0],[0,0,0],[0,0,0]], [[0,1,3,2]]);
}
